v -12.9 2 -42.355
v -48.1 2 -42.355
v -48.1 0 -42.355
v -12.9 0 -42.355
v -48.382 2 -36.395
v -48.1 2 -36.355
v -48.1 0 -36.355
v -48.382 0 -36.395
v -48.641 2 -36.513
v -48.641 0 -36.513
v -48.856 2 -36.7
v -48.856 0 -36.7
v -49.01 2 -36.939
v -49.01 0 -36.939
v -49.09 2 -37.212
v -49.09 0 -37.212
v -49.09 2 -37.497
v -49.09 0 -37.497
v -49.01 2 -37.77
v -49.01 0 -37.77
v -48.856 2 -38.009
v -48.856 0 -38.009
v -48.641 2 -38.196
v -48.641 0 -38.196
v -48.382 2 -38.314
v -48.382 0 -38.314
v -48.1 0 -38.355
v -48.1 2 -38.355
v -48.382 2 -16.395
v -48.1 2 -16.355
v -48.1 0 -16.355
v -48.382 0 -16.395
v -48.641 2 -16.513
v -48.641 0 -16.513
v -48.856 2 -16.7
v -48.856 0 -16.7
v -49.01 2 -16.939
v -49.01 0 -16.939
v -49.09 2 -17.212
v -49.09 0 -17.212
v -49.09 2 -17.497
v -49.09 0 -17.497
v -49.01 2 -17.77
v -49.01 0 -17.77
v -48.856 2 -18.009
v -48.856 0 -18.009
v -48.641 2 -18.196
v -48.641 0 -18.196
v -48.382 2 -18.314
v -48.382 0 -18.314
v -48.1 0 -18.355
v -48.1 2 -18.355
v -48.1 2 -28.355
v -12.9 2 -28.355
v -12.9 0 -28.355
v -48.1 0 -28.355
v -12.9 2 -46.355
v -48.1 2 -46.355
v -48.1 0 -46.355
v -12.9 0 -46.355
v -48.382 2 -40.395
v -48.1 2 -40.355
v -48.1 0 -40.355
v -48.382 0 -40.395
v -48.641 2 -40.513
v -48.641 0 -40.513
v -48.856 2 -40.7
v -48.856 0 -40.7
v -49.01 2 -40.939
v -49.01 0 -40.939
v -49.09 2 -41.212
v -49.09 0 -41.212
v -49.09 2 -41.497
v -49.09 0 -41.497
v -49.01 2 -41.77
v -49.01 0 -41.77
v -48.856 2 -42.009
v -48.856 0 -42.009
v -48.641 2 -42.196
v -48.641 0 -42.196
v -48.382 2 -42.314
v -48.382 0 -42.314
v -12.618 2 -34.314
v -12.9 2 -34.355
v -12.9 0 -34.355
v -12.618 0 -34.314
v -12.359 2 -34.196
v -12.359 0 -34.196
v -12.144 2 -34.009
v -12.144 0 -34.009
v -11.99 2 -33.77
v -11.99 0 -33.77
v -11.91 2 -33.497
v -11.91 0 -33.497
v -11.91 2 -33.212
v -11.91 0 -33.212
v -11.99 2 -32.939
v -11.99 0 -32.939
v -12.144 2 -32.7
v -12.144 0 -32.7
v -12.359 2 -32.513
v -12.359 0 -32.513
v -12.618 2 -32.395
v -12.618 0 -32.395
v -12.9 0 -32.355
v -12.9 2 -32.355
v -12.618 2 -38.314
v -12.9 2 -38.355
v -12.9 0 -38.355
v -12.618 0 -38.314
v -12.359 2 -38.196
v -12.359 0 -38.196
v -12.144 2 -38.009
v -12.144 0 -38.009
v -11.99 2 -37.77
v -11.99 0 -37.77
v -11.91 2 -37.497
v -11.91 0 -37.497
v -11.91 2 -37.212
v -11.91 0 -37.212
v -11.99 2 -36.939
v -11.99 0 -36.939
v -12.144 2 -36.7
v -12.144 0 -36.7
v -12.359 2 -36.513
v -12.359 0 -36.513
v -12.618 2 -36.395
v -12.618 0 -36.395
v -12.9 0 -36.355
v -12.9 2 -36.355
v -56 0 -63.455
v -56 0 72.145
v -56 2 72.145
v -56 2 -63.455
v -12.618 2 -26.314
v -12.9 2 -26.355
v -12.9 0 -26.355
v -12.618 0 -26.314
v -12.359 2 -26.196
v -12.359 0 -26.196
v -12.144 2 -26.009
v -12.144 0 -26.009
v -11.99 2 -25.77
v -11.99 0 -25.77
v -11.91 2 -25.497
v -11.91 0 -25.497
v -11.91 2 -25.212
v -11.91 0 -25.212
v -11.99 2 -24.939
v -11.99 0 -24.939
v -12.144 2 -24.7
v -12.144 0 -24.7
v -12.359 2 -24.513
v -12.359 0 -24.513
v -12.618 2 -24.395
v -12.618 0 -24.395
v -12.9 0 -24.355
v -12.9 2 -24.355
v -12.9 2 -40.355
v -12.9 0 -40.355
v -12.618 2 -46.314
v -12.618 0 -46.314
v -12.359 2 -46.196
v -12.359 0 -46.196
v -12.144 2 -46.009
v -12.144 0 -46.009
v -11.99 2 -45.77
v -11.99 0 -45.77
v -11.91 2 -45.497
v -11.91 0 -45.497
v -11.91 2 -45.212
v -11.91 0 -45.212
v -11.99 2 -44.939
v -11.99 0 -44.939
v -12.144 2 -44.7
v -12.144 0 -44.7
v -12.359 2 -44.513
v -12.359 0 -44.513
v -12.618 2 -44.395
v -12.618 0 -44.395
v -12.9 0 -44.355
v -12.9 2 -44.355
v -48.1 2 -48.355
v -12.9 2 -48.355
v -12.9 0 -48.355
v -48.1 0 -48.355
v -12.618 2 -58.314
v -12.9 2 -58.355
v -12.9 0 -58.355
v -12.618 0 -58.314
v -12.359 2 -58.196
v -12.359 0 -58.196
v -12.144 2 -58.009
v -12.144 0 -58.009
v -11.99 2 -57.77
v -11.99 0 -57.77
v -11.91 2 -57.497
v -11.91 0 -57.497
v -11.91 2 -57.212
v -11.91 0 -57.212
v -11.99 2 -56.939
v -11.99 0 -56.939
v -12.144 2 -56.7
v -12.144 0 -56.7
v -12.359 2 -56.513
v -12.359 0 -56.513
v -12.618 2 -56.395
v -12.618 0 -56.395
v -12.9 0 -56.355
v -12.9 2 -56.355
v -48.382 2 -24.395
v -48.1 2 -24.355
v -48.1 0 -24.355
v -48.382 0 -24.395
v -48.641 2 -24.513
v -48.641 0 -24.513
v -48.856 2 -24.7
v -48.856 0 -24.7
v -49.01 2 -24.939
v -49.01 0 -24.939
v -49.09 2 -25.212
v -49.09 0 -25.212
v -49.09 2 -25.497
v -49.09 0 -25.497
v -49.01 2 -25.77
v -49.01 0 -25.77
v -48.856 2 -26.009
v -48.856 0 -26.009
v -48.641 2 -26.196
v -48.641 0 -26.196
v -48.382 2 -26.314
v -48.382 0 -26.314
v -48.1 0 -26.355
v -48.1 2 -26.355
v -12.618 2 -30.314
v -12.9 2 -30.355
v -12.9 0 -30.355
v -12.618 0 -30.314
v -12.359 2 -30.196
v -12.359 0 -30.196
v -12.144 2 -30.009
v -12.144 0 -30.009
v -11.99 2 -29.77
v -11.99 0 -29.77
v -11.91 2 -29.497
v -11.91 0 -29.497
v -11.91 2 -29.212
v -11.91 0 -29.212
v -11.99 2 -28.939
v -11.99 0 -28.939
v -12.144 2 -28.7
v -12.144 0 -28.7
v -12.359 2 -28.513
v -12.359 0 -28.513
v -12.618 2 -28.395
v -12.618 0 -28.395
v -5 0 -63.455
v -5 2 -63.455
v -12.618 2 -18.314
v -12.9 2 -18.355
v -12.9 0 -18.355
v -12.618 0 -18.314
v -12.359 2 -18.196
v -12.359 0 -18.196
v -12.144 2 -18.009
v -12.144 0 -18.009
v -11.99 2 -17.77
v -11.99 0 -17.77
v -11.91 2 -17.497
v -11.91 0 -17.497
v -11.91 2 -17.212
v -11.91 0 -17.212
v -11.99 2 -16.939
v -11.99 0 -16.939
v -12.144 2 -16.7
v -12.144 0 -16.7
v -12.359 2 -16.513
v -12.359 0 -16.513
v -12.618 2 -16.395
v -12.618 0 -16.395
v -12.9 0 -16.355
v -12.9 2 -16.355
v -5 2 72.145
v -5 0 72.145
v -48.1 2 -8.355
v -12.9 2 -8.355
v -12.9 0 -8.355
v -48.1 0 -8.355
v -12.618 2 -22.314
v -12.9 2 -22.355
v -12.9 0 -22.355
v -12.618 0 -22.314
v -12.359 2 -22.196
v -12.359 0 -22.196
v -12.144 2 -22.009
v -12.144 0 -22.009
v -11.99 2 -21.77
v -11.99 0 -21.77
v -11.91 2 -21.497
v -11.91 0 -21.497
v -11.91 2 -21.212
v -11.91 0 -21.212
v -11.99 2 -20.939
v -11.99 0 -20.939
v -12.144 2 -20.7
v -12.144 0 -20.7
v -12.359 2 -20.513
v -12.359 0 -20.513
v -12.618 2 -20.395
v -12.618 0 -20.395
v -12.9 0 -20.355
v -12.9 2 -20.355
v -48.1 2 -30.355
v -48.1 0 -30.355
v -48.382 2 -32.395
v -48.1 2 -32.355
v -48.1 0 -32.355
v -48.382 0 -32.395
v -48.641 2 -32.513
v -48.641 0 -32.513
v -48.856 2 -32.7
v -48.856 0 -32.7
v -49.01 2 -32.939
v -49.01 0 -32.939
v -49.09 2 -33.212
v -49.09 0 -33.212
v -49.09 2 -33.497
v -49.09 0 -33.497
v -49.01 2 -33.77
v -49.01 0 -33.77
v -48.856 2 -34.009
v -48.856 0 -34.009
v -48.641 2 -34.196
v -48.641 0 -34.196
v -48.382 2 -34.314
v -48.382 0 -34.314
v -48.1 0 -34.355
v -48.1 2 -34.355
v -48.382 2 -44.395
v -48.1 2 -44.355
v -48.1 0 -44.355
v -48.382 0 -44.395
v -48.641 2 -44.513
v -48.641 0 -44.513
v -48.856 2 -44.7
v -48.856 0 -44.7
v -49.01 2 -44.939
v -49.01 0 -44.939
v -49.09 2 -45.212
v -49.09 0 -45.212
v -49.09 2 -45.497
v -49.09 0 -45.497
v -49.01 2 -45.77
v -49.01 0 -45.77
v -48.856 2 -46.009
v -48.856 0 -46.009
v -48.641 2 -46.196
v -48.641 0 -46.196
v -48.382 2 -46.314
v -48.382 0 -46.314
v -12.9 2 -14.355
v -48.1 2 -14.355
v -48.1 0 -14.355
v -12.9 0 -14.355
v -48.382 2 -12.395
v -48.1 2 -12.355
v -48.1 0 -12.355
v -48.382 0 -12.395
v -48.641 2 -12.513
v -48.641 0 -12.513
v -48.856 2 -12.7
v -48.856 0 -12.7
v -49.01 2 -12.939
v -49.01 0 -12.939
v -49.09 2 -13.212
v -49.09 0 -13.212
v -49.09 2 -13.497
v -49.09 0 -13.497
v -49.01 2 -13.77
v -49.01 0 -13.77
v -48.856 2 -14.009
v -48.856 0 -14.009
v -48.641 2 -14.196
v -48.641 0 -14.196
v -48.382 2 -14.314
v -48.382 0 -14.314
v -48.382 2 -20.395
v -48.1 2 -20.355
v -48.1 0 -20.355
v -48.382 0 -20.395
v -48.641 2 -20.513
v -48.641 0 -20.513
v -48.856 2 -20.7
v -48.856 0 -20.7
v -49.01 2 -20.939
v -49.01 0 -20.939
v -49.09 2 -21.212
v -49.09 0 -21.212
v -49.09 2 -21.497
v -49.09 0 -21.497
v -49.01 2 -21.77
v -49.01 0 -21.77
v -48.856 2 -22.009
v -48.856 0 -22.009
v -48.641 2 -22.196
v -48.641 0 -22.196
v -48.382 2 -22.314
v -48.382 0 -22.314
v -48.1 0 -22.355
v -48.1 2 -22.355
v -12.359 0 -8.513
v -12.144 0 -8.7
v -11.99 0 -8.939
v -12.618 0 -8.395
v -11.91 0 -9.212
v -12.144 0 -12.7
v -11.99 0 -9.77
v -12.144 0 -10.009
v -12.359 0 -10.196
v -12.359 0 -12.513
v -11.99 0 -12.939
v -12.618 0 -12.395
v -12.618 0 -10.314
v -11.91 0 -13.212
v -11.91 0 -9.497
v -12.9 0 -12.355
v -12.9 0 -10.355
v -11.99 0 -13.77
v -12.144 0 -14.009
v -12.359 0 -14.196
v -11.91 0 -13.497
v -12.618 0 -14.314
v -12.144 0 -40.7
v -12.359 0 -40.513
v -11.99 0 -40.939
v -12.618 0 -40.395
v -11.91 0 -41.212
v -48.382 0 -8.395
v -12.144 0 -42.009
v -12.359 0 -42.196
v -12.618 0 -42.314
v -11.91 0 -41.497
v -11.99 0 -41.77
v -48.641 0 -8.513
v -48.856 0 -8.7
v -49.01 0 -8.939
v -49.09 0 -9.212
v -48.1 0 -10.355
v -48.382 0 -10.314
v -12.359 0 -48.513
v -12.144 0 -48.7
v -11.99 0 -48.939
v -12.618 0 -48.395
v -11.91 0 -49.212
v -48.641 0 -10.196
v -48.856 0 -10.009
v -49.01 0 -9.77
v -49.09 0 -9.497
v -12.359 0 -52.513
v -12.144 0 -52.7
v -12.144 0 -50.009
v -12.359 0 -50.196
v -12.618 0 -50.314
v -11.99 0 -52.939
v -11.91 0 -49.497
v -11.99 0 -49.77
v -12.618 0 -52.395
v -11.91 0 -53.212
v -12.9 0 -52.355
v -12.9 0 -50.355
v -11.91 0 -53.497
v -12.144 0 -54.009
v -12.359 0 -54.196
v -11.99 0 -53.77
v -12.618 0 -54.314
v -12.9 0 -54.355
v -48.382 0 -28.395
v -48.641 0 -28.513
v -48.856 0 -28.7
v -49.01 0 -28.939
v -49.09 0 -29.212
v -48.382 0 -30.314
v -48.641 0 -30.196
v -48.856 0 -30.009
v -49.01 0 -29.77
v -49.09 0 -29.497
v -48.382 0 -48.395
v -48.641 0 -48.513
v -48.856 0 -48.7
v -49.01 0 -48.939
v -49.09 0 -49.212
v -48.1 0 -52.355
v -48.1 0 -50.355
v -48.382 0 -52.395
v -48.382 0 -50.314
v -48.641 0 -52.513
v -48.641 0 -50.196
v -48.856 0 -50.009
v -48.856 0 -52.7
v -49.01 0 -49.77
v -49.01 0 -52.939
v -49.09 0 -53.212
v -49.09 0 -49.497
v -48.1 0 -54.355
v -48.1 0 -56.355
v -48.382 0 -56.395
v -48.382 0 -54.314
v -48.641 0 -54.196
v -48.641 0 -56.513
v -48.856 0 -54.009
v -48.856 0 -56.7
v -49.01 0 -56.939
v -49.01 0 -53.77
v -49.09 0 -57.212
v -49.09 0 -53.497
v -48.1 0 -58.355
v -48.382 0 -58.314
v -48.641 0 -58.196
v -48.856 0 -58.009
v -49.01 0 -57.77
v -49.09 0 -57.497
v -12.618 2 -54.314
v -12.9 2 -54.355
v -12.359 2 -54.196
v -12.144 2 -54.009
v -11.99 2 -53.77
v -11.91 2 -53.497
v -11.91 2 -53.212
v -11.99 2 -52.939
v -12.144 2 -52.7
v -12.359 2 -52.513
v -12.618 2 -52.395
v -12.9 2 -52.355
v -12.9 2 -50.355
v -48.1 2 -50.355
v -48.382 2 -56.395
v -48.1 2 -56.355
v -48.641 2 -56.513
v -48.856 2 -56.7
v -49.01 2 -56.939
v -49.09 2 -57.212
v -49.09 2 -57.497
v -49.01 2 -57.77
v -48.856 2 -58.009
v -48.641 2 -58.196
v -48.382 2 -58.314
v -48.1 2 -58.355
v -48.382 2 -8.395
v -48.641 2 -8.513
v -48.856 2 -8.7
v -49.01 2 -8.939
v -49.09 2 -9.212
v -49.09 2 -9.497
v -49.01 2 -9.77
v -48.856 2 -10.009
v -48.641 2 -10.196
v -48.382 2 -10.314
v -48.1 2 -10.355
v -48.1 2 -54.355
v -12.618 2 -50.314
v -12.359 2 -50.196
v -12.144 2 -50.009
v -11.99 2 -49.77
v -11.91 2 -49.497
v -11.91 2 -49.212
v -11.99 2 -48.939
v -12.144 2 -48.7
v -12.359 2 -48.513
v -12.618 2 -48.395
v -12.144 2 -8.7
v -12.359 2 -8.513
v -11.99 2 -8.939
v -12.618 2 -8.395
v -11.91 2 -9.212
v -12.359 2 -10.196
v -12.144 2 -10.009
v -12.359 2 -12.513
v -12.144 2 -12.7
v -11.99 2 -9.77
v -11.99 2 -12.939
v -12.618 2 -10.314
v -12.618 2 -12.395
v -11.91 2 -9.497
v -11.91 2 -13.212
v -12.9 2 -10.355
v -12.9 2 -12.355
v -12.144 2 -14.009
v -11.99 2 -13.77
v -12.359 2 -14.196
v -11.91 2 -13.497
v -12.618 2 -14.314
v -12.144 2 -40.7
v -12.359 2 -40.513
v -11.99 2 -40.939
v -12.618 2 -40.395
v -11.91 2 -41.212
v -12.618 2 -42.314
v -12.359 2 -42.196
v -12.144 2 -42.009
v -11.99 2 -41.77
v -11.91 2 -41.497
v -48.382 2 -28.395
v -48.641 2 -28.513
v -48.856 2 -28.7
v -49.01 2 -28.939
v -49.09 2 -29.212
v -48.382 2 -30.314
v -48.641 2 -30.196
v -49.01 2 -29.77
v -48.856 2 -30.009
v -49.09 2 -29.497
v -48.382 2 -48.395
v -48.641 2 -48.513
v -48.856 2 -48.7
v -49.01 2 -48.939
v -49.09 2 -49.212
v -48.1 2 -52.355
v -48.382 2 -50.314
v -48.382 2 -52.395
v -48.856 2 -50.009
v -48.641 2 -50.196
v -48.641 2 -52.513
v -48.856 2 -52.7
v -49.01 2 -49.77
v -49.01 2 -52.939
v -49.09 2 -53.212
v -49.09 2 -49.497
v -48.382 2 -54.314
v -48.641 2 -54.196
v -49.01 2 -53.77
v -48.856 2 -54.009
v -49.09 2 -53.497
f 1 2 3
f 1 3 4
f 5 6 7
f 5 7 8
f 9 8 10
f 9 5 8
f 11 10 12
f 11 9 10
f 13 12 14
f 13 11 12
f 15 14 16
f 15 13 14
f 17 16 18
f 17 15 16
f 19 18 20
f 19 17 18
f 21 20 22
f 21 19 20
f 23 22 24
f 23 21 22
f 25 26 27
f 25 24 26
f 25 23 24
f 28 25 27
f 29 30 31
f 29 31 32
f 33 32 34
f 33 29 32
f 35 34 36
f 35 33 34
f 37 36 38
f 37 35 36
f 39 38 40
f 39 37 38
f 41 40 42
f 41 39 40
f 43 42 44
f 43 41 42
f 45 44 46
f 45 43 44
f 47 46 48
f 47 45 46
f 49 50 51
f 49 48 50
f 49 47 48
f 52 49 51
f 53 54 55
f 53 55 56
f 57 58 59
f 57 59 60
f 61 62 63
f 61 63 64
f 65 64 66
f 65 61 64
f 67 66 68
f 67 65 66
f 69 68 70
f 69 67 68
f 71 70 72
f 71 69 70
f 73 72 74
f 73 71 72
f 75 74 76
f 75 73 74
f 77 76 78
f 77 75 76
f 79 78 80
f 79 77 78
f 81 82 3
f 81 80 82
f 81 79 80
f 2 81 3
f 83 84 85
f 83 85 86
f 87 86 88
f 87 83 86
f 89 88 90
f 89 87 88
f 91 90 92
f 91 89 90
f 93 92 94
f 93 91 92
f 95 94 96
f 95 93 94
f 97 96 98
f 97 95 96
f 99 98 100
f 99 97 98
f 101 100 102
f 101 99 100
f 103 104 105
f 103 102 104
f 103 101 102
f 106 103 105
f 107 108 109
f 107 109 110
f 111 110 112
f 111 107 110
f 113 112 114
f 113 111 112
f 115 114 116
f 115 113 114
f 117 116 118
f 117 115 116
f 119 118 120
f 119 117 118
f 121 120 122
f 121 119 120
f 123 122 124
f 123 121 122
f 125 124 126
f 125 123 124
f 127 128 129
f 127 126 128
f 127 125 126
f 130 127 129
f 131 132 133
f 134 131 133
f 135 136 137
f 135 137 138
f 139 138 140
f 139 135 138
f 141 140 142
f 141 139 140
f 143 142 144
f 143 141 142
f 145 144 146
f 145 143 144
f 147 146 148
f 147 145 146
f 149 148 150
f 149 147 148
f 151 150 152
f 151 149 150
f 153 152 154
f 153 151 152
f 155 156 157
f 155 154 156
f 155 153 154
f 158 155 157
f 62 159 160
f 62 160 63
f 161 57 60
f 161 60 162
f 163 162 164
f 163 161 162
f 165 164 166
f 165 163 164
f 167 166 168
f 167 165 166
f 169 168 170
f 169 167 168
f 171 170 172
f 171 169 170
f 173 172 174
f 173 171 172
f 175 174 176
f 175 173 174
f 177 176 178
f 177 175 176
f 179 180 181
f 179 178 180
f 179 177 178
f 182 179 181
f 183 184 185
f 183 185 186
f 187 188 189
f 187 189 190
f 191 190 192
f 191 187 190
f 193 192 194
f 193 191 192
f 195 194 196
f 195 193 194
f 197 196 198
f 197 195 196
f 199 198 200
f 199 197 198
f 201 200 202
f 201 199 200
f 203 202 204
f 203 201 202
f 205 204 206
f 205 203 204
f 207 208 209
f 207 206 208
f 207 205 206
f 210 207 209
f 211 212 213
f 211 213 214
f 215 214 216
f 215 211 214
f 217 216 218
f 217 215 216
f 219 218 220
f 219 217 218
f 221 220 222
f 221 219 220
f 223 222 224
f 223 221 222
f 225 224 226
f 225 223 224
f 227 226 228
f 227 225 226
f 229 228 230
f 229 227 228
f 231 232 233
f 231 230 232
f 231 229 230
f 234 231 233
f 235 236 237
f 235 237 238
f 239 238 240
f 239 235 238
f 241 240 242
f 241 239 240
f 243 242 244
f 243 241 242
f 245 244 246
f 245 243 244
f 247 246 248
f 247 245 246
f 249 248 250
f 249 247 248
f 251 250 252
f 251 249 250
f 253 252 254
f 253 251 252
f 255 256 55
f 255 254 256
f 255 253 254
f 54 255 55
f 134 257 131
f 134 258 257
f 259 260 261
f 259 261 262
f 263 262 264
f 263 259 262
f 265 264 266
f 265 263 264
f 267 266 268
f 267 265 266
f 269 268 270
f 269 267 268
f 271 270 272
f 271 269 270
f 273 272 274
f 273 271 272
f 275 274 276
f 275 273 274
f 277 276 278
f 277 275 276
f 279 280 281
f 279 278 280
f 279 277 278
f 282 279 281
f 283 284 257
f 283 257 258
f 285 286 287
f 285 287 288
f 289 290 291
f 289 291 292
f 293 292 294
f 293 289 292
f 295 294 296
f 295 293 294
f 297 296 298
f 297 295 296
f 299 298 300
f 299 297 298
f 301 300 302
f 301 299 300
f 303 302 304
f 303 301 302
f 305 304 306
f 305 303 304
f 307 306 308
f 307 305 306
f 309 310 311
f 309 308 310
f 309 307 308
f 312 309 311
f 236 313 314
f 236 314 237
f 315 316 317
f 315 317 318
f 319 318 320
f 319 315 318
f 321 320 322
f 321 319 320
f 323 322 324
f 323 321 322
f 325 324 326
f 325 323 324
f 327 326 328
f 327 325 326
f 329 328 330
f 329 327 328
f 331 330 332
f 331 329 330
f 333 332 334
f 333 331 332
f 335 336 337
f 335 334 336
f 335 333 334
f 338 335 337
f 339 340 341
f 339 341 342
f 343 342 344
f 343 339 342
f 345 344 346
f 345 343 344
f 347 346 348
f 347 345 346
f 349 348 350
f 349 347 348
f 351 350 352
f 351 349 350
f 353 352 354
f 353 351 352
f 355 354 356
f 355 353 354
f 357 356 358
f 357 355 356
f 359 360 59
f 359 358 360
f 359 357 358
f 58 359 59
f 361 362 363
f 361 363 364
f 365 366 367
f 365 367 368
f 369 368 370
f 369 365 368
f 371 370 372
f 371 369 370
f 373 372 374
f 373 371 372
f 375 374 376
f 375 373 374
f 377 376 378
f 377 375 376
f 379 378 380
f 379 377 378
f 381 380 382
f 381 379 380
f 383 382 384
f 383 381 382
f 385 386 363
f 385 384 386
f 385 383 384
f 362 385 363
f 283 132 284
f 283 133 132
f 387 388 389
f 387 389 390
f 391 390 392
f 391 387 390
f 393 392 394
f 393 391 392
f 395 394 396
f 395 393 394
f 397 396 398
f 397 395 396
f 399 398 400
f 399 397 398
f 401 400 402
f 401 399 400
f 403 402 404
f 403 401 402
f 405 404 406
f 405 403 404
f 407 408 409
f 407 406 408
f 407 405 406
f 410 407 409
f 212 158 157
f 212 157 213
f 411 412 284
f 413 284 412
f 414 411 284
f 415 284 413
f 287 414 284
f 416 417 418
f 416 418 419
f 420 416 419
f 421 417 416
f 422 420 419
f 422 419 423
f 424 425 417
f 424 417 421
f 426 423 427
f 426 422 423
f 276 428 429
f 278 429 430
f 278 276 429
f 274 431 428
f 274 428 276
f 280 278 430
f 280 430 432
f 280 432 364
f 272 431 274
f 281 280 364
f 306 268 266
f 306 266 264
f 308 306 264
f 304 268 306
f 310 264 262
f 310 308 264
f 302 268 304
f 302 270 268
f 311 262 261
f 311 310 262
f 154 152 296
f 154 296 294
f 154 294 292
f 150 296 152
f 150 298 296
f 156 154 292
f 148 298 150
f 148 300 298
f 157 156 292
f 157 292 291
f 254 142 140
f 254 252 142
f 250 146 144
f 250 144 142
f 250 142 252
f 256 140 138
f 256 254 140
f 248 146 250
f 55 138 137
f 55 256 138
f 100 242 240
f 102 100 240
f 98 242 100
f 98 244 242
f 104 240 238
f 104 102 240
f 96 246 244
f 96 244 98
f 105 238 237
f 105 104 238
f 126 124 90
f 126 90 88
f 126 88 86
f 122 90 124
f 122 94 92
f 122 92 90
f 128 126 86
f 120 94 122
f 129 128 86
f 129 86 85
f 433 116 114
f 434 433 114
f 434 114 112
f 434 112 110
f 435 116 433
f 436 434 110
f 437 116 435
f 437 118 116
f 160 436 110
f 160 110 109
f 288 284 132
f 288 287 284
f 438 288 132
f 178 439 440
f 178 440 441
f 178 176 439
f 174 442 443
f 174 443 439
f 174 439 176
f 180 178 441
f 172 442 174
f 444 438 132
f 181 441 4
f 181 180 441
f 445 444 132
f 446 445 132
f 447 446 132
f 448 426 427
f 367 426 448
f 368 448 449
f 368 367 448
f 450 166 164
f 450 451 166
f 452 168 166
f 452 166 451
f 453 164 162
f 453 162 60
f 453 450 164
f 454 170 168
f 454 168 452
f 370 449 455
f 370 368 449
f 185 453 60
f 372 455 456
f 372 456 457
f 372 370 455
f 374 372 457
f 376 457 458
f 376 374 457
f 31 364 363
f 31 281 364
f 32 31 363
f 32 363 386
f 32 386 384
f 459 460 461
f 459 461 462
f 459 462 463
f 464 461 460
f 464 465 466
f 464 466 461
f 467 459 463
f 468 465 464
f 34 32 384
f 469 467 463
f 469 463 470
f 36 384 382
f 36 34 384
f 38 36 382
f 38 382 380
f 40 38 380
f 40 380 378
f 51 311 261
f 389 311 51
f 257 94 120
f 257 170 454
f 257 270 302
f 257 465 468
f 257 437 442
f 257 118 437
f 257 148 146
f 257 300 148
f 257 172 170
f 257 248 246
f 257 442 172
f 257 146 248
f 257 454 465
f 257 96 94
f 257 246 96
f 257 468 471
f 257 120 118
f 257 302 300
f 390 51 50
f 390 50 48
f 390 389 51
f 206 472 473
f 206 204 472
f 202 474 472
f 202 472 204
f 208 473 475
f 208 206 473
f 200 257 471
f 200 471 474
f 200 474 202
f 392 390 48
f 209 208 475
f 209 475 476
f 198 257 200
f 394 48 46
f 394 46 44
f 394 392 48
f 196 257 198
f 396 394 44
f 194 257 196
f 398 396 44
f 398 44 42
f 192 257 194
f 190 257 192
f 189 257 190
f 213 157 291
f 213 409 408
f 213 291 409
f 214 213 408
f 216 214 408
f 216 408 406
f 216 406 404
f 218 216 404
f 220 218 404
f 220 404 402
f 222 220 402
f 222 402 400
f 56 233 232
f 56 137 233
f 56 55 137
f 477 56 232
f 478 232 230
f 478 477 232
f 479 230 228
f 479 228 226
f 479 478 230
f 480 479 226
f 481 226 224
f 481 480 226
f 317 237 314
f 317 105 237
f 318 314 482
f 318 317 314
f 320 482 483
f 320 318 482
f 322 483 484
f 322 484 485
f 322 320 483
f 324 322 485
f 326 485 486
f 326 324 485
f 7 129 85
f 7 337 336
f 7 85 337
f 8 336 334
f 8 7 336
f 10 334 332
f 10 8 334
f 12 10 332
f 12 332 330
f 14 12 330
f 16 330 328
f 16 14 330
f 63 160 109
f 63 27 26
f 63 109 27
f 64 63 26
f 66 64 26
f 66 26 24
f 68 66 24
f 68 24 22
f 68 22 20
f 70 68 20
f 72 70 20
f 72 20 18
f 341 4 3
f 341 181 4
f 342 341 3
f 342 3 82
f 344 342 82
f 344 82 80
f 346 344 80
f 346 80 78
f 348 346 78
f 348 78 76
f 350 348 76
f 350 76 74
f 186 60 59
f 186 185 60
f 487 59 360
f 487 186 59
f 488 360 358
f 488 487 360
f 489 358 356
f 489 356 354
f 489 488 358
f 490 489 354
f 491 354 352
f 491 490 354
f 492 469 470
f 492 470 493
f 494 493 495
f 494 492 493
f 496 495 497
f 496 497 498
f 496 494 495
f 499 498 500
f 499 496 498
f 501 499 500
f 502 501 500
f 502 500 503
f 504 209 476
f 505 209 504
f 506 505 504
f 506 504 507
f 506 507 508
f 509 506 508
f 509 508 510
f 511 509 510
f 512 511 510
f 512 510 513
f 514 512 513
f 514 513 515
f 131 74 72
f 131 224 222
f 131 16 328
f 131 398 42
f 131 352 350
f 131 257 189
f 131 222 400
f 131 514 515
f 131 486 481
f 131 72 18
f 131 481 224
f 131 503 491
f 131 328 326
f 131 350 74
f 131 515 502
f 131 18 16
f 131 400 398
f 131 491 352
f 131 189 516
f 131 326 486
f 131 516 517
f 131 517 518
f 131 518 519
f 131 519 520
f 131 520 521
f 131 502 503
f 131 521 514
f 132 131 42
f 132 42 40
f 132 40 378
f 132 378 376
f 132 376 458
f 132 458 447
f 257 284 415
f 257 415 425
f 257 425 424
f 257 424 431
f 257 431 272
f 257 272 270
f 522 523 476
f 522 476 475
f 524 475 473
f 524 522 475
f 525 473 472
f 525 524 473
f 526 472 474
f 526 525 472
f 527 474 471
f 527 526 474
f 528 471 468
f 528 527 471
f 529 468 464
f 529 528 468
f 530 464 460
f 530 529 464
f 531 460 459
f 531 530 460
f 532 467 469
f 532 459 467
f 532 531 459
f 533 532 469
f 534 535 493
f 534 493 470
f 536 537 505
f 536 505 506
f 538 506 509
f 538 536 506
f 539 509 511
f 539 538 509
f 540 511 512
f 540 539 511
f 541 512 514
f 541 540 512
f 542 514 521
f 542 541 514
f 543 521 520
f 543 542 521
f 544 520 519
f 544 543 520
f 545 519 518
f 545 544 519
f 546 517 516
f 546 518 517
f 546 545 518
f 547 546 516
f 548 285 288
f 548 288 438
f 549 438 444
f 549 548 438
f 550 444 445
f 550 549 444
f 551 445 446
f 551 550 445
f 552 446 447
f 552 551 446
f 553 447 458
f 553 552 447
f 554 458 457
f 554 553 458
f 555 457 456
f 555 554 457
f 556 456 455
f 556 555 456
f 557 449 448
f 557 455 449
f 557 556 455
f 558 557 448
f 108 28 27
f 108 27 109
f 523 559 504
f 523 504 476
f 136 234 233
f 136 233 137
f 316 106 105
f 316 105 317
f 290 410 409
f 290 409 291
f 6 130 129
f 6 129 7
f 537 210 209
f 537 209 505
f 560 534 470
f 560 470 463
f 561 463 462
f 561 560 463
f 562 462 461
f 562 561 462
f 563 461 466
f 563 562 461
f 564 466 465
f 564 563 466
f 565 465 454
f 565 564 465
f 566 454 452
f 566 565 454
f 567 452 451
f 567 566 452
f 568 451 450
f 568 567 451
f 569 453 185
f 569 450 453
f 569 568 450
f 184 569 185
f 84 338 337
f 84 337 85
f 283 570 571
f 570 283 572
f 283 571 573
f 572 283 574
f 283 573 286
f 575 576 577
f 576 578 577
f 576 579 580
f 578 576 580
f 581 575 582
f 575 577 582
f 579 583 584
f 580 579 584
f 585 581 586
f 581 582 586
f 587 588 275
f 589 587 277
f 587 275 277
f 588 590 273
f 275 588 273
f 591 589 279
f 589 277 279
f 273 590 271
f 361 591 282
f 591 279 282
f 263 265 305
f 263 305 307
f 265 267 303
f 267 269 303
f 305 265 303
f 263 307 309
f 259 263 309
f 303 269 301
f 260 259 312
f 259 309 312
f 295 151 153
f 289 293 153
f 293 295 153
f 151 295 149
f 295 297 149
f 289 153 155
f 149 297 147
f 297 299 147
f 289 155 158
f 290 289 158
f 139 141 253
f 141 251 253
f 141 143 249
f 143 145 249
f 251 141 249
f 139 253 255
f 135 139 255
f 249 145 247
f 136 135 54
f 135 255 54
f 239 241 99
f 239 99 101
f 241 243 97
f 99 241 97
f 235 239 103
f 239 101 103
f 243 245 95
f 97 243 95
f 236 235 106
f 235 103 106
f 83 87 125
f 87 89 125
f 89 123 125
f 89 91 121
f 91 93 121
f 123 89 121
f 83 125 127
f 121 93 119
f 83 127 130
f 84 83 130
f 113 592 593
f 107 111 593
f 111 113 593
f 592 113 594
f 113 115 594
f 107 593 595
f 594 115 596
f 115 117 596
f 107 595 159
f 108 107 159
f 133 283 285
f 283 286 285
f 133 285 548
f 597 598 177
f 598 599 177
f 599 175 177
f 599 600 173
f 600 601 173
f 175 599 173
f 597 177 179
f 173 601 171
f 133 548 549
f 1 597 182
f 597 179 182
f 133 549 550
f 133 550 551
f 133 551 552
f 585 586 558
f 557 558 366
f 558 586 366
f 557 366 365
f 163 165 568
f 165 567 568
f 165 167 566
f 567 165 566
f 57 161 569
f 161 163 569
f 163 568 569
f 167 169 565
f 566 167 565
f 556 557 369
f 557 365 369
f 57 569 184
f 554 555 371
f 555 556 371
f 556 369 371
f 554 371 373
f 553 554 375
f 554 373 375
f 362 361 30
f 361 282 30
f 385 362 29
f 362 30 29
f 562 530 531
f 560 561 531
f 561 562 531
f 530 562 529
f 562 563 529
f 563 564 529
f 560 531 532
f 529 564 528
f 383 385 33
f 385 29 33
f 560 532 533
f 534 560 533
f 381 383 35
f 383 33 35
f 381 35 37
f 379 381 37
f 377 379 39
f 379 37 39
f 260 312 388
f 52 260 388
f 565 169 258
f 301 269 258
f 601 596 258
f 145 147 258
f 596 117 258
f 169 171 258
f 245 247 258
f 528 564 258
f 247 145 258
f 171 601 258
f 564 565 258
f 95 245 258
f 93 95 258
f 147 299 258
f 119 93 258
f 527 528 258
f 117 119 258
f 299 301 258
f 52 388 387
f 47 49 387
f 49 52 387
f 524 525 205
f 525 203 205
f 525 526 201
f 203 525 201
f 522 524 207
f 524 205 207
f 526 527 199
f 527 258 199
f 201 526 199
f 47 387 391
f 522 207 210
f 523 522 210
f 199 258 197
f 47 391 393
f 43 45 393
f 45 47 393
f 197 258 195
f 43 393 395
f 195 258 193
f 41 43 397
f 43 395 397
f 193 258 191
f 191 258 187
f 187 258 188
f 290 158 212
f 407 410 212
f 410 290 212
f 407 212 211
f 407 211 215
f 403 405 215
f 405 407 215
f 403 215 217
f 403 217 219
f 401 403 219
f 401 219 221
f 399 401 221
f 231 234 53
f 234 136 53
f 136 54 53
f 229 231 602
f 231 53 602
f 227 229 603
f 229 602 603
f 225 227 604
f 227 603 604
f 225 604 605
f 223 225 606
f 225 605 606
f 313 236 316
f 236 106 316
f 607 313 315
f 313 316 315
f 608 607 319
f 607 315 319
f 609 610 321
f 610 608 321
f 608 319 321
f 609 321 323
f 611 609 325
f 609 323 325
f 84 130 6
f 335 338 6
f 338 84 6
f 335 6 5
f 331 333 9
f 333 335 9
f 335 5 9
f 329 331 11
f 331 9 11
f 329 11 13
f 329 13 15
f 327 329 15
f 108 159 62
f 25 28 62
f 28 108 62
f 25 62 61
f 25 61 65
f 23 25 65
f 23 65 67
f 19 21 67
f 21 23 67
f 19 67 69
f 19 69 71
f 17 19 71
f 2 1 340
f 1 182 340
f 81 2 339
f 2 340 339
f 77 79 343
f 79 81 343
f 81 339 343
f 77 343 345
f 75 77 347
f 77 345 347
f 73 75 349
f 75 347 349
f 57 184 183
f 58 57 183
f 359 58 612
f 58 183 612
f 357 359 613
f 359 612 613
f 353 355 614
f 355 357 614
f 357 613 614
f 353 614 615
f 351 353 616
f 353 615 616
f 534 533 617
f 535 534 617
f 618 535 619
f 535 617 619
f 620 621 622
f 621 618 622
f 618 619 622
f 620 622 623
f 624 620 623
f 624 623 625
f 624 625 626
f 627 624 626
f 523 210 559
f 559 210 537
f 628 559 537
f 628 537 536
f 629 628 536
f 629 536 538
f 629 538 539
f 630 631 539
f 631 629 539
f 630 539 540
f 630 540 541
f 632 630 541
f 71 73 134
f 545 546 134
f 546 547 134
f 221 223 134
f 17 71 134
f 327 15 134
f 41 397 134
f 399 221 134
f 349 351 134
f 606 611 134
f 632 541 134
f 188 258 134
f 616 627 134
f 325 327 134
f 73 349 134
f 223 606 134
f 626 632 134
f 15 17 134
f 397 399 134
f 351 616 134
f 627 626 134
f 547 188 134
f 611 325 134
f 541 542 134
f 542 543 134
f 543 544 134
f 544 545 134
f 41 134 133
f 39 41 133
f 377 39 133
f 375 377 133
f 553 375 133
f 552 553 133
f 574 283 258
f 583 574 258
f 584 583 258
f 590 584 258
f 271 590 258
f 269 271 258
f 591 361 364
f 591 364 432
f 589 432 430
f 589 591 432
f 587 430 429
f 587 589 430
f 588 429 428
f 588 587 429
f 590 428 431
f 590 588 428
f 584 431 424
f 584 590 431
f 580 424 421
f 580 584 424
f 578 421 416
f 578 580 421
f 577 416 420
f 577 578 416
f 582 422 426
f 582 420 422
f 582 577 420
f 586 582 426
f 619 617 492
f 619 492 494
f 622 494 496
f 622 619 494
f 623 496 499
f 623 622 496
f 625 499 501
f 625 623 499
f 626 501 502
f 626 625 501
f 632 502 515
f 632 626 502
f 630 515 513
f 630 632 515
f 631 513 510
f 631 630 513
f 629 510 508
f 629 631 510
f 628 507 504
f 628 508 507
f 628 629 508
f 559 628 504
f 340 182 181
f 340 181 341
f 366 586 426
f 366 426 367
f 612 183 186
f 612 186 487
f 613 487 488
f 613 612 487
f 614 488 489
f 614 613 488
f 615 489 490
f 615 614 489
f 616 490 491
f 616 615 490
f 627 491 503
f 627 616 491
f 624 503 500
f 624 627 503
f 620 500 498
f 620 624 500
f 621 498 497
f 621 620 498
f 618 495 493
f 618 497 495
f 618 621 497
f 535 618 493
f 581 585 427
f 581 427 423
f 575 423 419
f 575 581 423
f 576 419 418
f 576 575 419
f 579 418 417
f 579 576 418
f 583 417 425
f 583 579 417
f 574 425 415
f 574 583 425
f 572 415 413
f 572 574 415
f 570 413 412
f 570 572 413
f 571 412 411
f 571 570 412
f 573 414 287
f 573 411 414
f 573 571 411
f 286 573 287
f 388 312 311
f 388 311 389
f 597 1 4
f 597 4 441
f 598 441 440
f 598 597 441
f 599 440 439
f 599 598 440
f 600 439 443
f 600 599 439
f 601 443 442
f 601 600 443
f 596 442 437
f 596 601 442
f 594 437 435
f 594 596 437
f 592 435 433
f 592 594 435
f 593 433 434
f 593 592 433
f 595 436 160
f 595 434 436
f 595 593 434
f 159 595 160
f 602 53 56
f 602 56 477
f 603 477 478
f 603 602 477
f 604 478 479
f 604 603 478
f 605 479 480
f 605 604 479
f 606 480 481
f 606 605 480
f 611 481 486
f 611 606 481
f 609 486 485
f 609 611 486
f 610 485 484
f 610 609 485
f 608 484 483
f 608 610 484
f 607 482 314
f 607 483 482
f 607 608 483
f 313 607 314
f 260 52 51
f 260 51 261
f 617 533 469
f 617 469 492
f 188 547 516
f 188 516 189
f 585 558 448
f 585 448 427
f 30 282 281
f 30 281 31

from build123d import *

# Parameters (mm, degrees)
SKETCH1_W           = 51
SKETCH1_H           = 136
BOSS_EXTRUDE1_DEPTH = 2
CUT_EXTRUDE1_DEPTH  = 10
SKETCH5_W           = 1
SKETCH5_H           = 2
BOSS_EXTRUDE2_DEPTH = 136
SKETCH6_W           = 1
SKETCH6_H           = 2
BOSS_EXTRUDE3_DEPTH = 136
SKETCH7_W           = 68.795835126
SKETCH7_H           = 26.425628728
CUT_EXTRUDE2_DEPTH  = 0.4
SKETCH8_W           = 2
SKETCH8_H           = 2
CUT_EXTRUDE3_DEPTH  = 135.6


with BuildPart() as part:
    # Sketch1 → Boss-Extrude1 (new body)
    with BuildSketch(Plane(origin=(0, 0, 0), x_dir=(1, 0, 0), z_dir=(0, 1, 0))):
        with Locations((-30.5, -4.545454545)):
            Rectangle(SKETCH1_W, SKETCH1_H)
    extrude(amount=BOSS_EXTRUDE1_DEPTH)

    # Sketch4 → Cut-Extrude1 (cut)
    with BuildSketch(Plane(origin=(0, 2, 0), x_dir=(1, 0, 0), z_dir=(0, 1, 0))):
        with BuildLine():
            Line((-48.1, 58.354545455), (-12.9, 58.354545455))
            ThreePointArc((-12.9, 58.354545455), (-11.9, 57.354545455), (-12.9, 56.354545455))
            Line((-12.9, 56.354545455), (-48.1, 56.354545455))
            ThreePointArc((-48.1, 56.354545455), (-49.1, 57.354545455), (-48.1, 58.354545455))
        make_face()
        with BuildLine():
            Line((-48.1, 54.354545455), (-12.9, 54.354545455))
            ThreePointArc((-12.9, 54.354545455), (-11.9, 53.354545455), (-12.9, 52.354545455))
            Line((-12.9, 52.354545455), (-48.1, 52.354545455))
            ThreePointArc((-48.1, 52.354545455), (-49.1, 53.354545455), (-48.1, 54.354545455))
        make_face()
        with BuildLine():
            Line((-48.1, 50.354545455), (-12.9, 50.354545455))
            ThreePointArc((-12.9, 50.354545455), (-11.9, 49.354545455), (-12.9, 48.354545455))
            Line((-12.9, 48.354545455), (-48.1, 48.354545455))
            ThreePointArc((-48.1, 48.354545455), (-49.1, 49.354545455), (-48.1, 50.354545455))
        make_face()
        with BuildLine():
            Line((-48.1, 46.354545455), (-12.9, 46.354545455))
            ThreePointArc((-12.9, 46.354545455), (-11.9, 45.354545455), (-12.9, 44.354545455))
            Line((-12.9, 44.354545455), (-48.1, 44.354545455))
            ThreePointArc((-48.1, 44.354545455), (-49.1, 45.354545455), (-48.1, 46.354545455))
        make_face()
        with BuildLine():
            Line((-48.1, 42.354545455), (-12.9, 42.354545455))
            ThreePointArc((-12.9, 42.354545455), (-11.9, 41.354545455), (-12.9, 40.354545455))
            Line((-12.9, 40.354545455), (-48.1, 40.354545455))
            ThreePointArc((-48.1, 40.354545455), (-49.1, 41.354545455), (-48.1, 42.354545455))
        make_face()
        with BuildLine():
            Line((-48.1, 38.354545455), (-12.9, 38.354545455))
            ThreePointArc((-12.9, 38.354545455), (-11.9, 37.354545455), (-12.9, 36.354545455))
            Line((-12.9, 36.354545455), (-48.1, 36.354545455))
            ThreePointArc((-48.1, 36.354545455), (-49.1, 37.354545455), (-48.1, 38.354545455))
        make_face()
        with BuildLine():
            Line((-48.1, 34.354545455), (-12.9, 34.354545455))
            ThreePointArc((-12.9, 34.354545455), (-11.9, 33.354545455), (-12.9, 32.354545455))
            Line((-12.9, 32.354545455), (-48.1, 32.354545455))
            ThreePointArc((-48.1, 32.354545455), (-49.1, 33.354545455), (-48.1, 34.354545455))
        make_face()
        with BuildLine():
            Line((-48.1, 30.354545455), (-12.9, 30.354545455))
            ThreePointArc((-12.9, 30.354545455), (-11.9, 29.354545455), (-12.9, 28.354545455))
            Line((-12.9, 28.354545455), (-48.1, 28.354545455))
            ThreePointArc((-48.1, 28.354545455), (-49.1, 29.354545455), (-48.1, 30.354545455))
        make_face()
        with BuildLine():
            Line((-48.1, 26.354545455), (-12.9, 26.354545455))
            ThreePointArc((-12.9, 26.354545455), (-11.9, 25.354545455), (-12.9, 24.354545455))
            Line((-12.9, 24.354545455), (-48.1, 24.354545455))
            ThreePointArc((-48.1, 24.354545455), (-49.1, 25.354545455), (-48.1, 26.354545455))
        make_face()
        with BuildLine():
            Line((-48.1, 22.354545455), (-12.9, 22.354545455))
            ThreePointArc((-12.9, 22.354545455), (-11.9, 21.354545455), (-12.9, 20.354545455))
            Line((-12.9, 20.354545455), (-48.1, 20.354545455))
            ThreePointArc((-48.1, 20.354545455), (-49.1, 21.354545455), (-48.1, 22.354545455))
        make_face()
        with BuildLine():
            Line((-48.1, 18.354545455), (-12.9, 18.354545455))
            ThreePointArc((-12.9, 18.354545455), (-11.9, 17.354545455), (-12.9, 16.354545455))
            Line((-12.9, 16.354545455), (-48.1, 16.354545455))
            ThreePointArc((-48.1, 16.354545455), (-49.1, 17.354545455), (-48.1, 18.354545455))
        make_face()
        with BuildLine():
            Line((-48.1, 14.354545455), (-12.9, 14.354545455))
            ThreePointArc((-12.9, 14.354545455), (-11.9, 13.354545455), (-12.9, 12.354545455))
            Line((-12.9, 12.354545455), (-48.1, 12.354545455))
            ThreePointArc((-48.1, 12.354545455), (-49.1, 13.354545455), (-48.1, 14.354545455))
        make_face()
        with BuildLine():
            Line((-48.1, 10.354545455), (-12.9, 10.354545455))
            ThreePointArc((-12.9, 10.354545455), (-11.9, 9.354545455), (-12.9, 8.354545455))
            Line((-12.9, 8.354545455), (-48.1, 8.354545455))
            ThreePointArc((-48.1, 8.354545455), (-49.1, 9.354545455), (-48.1, 10.354545455))
        make_face()
    extrude(amount=-CUT_EXTRUDE1_DEPTH, mode=Mode.SUBTRACT)

    # Sketch5 → Boss-Extrude2 (add)
    with BuildSketch(Plane(origin=(0, 0, -63.454545455), x_dir=(-1, 0, 0), z_dir=(0, 0, -1))):
        with Locations((56.5, 1)):
            Rectangle(SKETCH5_W, SKETCH5_H)
        with Locations((4.5, 1)):
            Rectangle(SKETCH5_W, SKETCH5_H)
    extrude(amount=-BOSS_EXTRUDE2_DEPTH)

    # Sketch6 → Boss-Extrude3 (add)
    with BuildSketch(Plane(origin=(0, 0, -63.454545455), x_dir=(-1, 0, 0), z_dir=(0, 0, -1))):
        with Locations((57.5, 1)):
            Rectangle(SKETCH6_W, SKETCH6_H)
        with Locations((3.5, 1)):
            Rectangle(SKETCH6_W, SKETCH6_H)
    extrude(amount=-BOSS_EXTRUDE3_DEPTH)

    # Sketch7 → Cut-Extrude2 (cut)
    with BuildSketch(Plane.XY.offset(72.545454545)):
        with Locations((-32.339758962, -3.400766566)):
            Rectangle(SKETCH7_W, SKETCH7_H)
    extrude(amount=-CUT_EXTRUDE2_DEPTH, mode=Mode.SUBTRACT)

    # Sketch8 → Cut-Extrude3 (cut)
    with BuildSketch(Plane(origin=(0, 0, -63.454545455), x_dir=(-1, 0, 0), z_dir=(0, 0, -1))):
        with Locations((4, 1)):
            Rectangle(SKETCH8_W, SKETCH8_H)
        with Locations((57, 1)):
            Rectangle(SKETCH8_W, SKETCH8_H)
    extrude(amount=-CUT_EXTRUDE3_DEPTH, mode=Mode.SUBTRACT)


solid = part.part
